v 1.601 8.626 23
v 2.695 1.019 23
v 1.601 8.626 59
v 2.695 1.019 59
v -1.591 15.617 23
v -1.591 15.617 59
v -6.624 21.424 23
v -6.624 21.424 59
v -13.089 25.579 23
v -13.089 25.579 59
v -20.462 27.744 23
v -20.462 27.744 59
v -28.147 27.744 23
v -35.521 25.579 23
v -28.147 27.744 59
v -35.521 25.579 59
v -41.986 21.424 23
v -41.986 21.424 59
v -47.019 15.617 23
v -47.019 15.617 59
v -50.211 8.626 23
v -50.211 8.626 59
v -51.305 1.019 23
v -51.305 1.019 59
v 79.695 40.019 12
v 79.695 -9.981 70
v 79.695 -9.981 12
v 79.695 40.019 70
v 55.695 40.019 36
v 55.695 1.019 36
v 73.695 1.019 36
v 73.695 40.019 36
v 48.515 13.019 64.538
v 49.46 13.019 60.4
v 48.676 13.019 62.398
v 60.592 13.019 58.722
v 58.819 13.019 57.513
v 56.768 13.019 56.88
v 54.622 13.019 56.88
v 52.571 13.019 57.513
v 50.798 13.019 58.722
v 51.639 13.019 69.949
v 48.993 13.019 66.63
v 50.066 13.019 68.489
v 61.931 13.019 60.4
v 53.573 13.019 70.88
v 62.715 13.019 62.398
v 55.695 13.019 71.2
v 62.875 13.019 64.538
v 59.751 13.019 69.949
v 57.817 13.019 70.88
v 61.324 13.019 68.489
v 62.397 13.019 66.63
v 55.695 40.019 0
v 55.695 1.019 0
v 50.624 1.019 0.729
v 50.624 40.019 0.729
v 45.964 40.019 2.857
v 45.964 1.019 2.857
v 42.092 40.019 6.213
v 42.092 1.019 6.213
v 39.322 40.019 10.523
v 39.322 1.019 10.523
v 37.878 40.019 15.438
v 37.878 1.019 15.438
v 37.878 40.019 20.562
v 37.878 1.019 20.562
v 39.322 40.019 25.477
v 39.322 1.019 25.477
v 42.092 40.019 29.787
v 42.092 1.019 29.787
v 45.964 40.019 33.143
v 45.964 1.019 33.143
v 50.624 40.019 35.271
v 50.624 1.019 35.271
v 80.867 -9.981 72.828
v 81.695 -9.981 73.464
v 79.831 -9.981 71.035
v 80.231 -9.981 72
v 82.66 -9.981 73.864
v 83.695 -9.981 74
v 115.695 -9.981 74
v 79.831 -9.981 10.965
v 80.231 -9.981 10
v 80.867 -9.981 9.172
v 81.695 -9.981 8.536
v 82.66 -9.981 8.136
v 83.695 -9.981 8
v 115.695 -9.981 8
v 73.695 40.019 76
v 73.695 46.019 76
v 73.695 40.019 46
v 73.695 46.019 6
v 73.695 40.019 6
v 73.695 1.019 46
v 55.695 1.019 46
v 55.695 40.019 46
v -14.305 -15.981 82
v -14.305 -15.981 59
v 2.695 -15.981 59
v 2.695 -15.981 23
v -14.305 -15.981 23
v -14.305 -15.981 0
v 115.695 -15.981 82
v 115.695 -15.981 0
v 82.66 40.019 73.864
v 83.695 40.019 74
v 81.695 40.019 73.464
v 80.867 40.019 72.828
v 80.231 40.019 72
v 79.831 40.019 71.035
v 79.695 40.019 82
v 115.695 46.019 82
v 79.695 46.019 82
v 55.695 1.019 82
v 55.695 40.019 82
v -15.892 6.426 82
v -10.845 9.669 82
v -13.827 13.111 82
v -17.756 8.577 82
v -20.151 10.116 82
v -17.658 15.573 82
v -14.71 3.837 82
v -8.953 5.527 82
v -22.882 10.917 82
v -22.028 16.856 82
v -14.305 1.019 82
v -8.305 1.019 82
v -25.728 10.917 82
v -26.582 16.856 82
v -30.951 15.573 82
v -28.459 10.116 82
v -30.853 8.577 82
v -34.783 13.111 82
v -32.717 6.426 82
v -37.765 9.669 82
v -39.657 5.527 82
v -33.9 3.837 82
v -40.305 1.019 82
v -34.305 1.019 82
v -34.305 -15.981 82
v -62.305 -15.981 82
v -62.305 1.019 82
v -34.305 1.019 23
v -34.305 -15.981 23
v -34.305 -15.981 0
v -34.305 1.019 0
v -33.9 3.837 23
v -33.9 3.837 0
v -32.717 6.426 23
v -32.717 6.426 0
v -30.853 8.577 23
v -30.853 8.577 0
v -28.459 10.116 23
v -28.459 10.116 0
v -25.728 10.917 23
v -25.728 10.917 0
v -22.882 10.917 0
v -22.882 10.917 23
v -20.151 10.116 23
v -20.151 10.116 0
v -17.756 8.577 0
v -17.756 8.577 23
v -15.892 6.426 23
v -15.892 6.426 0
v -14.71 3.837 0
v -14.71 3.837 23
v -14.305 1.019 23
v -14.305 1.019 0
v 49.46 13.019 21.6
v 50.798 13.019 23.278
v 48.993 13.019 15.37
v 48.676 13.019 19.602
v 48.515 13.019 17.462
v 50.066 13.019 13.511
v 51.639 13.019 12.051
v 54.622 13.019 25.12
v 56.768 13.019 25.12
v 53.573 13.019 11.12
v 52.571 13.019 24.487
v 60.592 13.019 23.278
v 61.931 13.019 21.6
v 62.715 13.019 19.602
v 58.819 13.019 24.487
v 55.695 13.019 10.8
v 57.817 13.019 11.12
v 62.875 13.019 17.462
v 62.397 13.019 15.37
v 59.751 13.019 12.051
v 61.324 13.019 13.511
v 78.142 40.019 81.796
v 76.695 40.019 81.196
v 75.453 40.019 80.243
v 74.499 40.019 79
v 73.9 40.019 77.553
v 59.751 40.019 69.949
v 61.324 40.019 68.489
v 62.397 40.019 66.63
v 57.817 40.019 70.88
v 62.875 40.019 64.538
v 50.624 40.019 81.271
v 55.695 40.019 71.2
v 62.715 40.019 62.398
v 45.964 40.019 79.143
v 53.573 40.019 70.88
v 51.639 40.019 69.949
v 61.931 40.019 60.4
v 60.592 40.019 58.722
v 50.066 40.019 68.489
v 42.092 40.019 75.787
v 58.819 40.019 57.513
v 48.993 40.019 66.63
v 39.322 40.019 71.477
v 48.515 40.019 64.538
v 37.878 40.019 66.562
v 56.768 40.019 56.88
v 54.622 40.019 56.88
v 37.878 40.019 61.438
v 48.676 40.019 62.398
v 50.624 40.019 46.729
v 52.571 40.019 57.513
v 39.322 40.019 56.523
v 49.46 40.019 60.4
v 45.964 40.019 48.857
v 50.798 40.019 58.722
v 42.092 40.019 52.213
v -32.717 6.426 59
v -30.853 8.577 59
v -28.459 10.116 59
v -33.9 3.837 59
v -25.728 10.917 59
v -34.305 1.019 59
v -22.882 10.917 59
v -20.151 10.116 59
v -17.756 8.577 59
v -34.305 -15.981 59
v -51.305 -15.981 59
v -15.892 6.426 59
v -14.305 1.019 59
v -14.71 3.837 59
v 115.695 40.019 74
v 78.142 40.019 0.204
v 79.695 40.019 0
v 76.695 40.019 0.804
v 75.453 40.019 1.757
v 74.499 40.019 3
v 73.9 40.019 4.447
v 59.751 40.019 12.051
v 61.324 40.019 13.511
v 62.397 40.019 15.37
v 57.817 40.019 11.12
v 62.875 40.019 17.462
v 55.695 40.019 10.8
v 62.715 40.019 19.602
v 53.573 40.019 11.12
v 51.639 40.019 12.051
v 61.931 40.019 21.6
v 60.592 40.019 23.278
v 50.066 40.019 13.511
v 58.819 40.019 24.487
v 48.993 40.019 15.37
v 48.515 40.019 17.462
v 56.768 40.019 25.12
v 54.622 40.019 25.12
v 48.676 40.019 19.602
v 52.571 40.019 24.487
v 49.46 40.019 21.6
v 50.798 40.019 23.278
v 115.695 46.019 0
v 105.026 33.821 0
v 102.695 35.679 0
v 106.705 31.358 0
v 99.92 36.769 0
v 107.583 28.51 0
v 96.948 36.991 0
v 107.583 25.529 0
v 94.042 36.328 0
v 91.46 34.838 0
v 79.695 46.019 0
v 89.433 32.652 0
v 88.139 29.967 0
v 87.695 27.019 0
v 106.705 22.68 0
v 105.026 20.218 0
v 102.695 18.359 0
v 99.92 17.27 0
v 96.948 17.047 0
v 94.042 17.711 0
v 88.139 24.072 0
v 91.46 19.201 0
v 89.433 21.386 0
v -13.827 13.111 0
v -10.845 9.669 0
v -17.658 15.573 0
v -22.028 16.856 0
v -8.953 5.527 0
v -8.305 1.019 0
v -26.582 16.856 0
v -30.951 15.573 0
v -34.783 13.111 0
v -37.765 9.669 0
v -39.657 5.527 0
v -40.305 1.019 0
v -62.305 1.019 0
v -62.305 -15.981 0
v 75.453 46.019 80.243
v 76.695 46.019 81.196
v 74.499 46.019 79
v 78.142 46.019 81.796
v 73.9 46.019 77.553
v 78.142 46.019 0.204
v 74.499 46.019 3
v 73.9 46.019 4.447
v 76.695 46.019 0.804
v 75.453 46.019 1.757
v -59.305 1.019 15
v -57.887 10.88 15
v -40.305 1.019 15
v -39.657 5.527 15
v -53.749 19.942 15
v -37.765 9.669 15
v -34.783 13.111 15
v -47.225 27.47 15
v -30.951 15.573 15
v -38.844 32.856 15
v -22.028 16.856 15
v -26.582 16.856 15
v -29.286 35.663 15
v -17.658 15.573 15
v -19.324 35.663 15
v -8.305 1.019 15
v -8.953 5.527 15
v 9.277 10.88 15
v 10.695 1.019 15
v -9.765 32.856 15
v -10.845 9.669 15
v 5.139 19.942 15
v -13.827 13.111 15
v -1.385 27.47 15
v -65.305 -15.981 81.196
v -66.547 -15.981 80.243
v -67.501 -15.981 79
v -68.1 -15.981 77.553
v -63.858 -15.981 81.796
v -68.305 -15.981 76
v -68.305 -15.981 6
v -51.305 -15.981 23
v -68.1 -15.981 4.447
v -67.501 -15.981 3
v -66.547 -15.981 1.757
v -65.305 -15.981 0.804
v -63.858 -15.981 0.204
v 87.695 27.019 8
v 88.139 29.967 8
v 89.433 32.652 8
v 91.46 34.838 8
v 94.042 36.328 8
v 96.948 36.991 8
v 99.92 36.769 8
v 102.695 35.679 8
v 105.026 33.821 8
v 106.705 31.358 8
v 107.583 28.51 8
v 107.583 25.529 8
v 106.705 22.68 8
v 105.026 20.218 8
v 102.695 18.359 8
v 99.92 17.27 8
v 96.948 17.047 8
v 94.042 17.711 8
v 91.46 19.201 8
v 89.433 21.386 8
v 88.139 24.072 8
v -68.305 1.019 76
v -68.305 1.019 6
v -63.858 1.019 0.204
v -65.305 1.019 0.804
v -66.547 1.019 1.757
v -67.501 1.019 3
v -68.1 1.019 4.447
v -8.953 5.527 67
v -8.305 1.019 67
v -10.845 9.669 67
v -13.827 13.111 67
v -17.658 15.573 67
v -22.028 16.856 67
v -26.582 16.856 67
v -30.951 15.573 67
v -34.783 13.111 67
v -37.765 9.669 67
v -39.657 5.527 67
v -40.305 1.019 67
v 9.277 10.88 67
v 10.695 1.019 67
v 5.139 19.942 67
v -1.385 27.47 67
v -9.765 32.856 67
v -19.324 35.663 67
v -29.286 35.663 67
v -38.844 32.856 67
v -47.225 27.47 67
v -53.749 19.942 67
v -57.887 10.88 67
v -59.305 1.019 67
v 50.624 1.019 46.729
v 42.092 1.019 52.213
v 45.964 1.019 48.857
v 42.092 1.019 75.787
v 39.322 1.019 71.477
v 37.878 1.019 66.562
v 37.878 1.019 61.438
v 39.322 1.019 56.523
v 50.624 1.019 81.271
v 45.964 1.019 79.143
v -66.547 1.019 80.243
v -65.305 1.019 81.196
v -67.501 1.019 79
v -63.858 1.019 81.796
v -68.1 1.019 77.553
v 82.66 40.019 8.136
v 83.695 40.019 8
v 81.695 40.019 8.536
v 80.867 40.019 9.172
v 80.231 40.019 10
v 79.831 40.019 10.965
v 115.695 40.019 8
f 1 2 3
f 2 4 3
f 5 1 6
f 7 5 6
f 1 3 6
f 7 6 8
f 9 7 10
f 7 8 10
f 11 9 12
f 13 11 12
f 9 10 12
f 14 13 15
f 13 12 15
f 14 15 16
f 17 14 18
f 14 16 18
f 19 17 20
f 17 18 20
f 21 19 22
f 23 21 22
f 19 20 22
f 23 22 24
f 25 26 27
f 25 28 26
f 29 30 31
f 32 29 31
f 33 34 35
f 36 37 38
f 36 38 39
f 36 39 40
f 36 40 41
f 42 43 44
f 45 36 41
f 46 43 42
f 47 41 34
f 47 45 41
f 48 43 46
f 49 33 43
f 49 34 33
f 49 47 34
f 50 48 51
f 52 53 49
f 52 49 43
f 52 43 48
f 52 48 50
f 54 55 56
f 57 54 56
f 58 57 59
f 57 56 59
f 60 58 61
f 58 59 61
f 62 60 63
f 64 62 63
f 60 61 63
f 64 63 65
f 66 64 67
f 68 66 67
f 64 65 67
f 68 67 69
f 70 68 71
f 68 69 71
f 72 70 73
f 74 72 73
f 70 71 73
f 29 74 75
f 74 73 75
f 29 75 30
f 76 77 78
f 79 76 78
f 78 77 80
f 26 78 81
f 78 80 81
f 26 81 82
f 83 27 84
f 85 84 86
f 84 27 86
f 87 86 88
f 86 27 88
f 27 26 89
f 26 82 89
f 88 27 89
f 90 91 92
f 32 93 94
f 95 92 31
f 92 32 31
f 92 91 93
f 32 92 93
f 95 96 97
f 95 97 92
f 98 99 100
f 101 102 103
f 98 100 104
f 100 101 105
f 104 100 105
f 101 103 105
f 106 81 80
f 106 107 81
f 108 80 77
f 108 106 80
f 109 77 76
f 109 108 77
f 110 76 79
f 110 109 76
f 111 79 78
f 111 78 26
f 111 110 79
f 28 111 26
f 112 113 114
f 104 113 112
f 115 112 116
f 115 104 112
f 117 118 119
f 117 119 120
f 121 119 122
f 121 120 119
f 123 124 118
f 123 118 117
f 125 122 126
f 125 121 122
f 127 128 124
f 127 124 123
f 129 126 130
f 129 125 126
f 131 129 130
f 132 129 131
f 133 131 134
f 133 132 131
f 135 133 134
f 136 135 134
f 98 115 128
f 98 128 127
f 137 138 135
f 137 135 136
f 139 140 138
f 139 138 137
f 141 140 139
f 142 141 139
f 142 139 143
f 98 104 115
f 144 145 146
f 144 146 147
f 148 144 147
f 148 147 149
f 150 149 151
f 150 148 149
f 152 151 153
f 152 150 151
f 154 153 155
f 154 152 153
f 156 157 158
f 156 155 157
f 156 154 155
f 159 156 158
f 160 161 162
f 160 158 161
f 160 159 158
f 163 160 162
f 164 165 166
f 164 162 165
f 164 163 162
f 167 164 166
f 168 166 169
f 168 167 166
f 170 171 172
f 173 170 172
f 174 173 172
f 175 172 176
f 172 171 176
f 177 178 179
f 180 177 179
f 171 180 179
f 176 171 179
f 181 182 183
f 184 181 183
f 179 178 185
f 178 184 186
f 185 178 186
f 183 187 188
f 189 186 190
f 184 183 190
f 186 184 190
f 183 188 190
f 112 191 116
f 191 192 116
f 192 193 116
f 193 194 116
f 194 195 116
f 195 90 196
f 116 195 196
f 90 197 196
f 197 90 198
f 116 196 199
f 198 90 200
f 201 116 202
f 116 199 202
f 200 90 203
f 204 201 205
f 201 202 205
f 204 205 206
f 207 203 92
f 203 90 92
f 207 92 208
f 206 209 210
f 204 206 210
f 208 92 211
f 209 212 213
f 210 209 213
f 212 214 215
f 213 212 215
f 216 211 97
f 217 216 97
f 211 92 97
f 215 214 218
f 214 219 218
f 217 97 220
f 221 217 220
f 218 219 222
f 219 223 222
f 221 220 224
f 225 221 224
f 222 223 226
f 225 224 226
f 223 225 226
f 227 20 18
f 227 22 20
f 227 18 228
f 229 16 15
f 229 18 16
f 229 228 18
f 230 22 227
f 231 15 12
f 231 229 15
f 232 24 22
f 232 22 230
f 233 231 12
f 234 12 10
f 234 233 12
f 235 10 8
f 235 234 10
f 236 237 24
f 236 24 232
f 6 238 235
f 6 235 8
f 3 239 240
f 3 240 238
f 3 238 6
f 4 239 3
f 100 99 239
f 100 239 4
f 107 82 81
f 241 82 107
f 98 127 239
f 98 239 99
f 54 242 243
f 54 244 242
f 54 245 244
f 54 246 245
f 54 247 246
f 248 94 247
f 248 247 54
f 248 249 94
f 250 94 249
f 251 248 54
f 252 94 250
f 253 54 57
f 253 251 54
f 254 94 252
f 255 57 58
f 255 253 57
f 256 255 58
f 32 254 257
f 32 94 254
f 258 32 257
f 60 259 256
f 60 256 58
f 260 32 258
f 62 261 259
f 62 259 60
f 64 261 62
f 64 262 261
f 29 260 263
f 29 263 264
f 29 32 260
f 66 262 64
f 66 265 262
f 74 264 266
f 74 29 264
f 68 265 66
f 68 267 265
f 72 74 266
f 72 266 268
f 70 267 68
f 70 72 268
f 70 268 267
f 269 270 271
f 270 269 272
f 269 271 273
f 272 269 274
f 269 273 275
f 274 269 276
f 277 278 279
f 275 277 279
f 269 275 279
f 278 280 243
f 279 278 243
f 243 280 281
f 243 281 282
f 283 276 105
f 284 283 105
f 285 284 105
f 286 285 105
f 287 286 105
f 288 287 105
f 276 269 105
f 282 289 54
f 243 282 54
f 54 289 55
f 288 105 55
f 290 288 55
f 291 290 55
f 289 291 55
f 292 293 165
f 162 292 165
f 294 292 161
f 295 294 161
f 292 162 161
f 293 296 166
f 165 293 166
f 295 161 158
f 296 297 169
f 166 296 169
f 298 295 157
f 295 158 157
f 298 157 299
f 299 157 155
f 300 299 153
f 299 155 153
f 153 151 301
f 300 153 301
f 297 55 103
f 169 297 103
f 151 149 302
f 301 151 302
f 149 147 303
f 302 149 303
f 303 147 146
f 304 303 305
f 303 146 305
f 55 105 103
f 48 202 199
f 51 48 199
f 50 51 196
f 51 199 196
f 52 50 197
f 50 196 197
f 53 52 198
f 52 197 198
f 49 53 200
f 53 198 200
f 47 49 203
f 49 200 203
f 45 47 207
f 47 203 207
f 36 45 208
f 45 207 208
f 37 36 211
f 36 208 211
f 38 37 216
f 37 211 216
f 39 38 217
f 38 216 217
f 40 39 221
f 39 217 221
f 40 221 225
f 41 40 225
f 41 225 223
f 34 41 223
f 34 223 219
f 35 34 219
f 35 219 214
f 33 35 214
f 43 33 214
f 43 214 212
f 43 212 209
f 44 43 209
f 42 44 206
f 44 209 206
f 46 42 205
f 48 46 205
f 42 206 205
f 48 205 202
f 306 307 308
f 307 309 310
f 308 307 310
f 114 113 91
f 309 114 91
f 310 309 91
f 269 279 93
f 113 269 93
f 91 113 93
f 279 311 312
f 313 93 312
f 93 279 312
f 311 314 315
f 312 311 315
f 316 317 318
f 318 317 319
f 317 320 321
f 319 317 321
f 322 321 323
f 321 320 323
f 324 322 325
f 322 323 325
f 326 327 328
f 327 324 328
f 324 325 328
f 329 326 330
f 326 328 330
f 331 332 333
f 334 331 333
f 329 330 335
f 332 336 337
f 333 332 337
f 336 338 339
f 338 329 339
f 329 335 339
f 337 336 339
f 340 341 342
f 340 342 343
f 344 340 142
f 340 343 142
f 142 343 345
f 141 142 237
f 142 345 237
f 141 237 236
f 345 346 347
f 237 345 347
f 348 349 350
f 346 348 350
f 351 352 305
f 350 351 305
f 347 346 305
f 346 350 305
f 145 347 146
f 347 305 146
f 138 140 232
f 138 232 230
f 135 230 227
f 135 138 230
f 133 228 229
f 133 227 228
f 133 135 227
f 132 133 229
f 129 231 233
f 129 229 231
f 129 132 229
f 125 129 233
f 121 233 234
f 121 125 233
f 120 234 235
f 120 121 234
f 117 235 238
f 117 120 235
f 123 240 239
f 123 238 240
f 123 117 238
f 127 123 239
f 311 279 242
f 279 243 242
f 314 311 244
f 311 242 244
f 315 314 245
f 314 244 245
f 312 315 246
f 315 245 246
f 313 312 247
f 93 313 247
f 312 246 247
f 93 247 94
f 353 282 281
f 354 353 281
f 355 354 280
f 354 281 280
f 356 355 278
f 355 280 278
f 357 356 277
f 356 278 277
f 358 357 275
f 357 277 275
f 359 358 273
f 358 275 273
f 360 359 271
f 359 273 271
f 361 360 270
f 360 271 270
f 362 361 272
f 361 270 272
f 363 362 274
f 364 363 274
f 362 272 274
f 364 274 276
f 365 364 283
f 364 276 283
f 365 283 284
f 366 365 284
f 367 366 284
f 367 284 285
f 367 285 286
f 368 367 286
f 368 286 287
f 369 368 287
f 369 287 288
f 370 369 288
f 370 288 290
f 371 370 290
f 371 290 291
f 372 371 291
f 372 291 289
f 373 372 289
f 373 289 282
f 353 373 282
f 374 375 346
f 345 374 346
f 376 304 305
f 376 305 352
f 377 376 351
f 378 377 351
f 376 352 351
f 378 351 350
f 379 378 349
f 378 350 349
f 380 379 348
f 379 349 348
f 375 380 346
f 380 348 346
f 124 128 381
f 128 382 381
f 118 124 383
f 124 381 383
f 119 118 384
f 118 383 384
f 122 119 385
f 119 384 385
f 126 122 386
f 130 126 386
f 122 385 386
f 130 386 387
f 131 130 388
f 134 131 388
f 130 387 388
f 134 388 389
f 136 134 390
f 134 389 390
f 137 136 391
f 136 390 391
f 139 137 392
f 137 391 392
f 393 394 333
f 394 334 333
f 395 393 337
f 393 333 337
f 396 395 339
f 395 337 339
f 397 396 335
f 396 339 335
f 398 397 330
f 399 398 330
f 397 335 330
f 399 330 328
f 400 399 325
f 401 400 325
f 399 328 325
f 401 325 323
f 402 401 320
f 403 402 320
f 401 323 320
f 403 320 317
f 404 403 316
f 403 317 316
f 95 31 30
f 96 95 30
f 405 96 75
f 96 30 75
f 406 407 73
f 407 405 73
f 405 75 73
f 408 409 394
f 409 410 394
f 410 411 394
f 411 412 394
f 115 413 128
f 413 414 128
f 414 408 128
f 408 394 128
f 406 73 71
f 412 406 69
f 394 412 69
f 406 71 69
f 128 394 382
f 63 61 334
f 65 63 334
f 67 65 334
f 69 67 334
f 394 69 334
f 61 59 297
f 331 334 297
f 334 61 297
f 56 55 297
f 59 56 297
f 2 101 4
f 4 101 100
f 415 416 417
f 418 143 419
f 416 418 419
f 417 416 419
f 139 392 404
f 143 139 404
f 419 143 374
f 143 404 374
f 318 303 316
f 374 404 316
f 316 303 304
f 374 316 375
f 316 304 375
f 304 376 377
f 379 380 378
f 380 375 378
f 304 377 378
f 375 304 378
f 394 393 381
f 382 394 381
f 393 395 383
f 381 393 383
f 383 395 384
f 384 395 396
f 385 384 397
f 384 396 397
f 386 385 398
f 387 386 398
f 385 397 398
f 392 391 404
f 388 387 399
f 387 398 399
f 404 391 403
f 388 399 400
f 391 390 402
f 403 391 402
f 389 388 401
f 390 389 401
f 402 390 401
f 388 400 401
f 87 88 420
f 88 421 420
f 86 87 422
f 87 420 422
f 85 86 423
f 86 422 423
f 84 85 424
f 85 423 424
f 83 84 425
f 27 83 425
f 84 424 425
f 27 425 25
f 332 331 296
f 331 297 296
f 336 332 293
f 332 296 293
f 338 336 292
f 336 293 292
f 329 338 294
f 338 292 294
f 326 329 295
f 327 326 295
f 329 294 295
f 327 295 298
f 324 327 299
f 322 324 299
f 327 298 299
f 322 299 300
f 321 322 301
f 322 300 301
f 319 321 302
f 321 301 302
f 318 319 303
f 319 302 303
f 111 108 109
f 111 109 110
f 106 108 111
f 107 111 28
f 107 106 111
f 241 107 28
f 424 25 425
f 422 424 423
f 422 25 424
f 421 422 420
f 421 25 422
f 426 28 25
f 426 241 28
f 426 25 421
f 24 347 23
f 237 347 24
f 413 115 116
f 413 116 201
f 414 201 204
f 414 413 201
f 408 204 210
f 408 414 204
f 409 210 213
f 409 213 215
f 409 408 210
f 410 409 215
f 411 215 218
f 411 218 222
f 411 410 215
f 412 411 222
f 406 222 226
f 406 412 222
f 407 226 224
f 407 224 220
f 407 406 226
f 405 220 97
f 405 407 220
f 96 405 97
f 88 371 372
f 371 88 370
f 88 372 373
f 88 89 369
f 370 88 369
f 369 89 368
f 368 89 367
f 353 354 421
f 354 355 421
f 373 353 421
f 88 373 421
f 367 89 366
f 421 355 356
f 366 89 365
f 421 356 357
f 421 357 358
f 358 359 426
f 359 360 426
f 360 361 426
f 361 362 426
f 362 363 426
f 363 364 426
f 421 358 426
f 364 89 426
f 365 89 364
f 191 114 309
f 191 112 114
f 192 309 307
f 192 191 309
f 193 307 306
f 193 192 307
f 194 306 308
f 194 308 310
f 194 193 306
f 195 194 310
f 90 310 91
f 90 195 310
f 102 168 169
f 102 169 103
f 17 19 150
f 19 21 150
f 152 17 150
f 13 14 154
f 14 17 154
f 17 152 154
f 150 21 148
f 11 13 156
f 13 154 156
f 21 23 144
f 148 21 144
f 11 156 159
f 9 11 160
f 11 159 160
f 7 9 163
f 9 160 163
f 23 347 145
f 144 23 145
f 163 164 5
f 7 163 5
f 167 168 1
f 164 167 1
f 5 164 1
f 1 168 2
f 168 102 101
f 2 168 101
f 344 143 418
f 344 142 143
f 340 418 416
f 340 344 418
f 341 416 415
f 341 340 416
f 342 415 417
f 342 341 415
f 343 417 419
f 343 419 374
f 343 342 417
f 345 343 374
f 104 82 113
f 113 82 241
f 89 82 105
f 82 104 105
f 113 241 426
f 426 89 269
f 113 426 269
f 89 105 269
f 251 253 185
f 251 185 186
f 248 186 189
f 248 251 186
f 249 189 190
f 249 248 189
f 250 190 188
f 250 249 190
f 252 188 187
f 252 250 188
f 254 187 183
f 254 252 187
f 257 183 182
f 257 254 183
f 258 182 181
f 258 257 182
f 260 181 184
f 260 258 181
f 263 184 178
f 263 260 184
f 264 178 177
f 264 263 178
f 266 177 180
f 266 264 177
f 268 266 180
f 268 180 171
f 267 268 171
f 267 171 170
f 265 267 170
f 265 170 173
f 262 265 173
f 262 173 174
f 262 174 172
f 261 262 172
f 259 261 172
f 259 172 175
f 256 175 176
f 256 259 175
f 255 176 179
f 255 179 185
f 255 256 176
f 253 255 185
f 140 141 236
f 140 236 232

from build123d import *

# Parameters (mm, degrees)
BOSS_EXTRUDE1_DEPTH = 82
SKETCH2_W           = 66
SKETCH2_H           = 50
CUT_EXTRUDE1_DEPTH  = 36
SKETCH3_R           = 10
CUT_EXTRUDE2_DEPTH  = 36
BOSS_EXTRUDE6_DEPTH = 39
SKETCH5_R           = 7.2
CUT_EXTRUDE3_DEPTH  = 27
REVOLVE2_ANGLE      = 180
CUT_EXTRUDE4_DEPTH  = 153
SKETCH10_W          = 54
SKETCH10_H          = 36
CUT_EXTRUDE5_DEPTH  = 17
SKETCH11_W          = 17
SKETCH11_H          = 36
CUT_REVOLVE2_ANGLE  = 180
FILLET1_R           = 4
FILLET2_R           = 6


with BuildPart() as part:
    # Sketch1 → Boss-Extrude1 (new body)
    with BuildSketch(Plane.XY):
        Polygon((-68.304856892, -15.980758971), (115.695143108, -15.980758971), (115.695143108, 46.019241029), (73.695143108, 46.019241029), (73.695143108, 1.019241029), (-68.304856892, 1.019241029), align=None)
    extrude(amount=BOSS_EXTRUDE1_DEPTH)

    # Sketch2 → Cut-Extrude1 (cut)
    with BuildSketch(Plane(origin=(115.695143108, 0, 0), x_dir=(0, 0, -1), z_dir=(1, 0, 0))):
        with Locations((-41, 15.019241029)):
            Rectangle(SKETCH2_W, SKETCH2_H)
    extrude(amount=-CUT_EXTRUDE1_DEPTH, mode=Mode.SUBTRACT)

    # Sketch3 → Cut-Extrude2 (cut)
    with BuildSketch(Plane(origin=(0, 0, 0), x_dir=(-1, 0, 0), z_dir=(0, 0, -1))):
        with Locations((-97.695143108, 27.019241029)):
            Circle(SKETCH3_R)
    extrude(amount=-CUT_EXTRUDE2_DEPTH, mode=Mode.SUBTRACT)

    # Sketch4 → Boss-Extrude6 (add)
    with BuildSketch(Plane(origin=(0, 1.019241029, 0), x_dir=(1, 0, 0), z_dir=(0, 1, 0))):
        with BuildLine():
            Line((55.695143108, -46), (73.695143108, -46))
            Line((73.695143108, -46), (73.695143108, -82))
            Line((73.695143108, -82), (55.695143108, -82))
            ThreePointArc((55.695143108, -82), (37.695143108, -64), (55.695143108, -46))
        make_face()
    boss_extrude6 = extrude(amount=BOSS_EXTRUDE6_DEPTH)

    # Sketch5 → Cut-Extrude3 (cut)
    with BuildSketch(Plane(origin=(0, 40.019241029, 0), x_dir=(1, 0, 0), z_dir=(0, 1, 0))):
        with Locations(Location((55.695143108, -64, 0), (0, 0, 270))):
            Circle(SKETCH5_R)
    cut_extrude3 = extrude(amount=-CUT_EXTRUDE3_DEPTH, mode=Mode.SUBTRACT)

    # Mirror3: Boss-Extrude6, Cut-Extrude3 across plane
    add(boss_extrude6.mirror(Plane.XY.offset(41)))
    add(cut_extrude3.mirror(Plane.XY.offset(41)), mode=Mode.SUBTRACT)

    # Sketch7 → Revolve2 (revolve)
    with BuildSketch(Plane(origin=(0, 1.019241029, 0), x_dir=(1, 0, 0), z_dir=(0, 1, 0))):
        Polygon((-24.304856892, 0), (-24.304856892, -82), (-8.304856892, -82), (-8.304856892, -67), (10.695143108, -67), (10.695143108, -15), (-8.304856892, -15), (-8.304856892, 0), align=None)
    revolve(axis=Axis((-24.304856892, 1.019241029, 0), (0, 0, 1)), revolution_arc=REVOLVE2_ANGLE)

    # Sketch8 → Cut-Extrude4 (cut)
    with BuildSketch(Plane.XY.offset(82)):
        with BuildLine():
            Line((-14.304856892, 1.019241029), (-14.304856892, -15.980758971))
            Line((-14.304856892, -15.980758971), (-34.304856892, -15.980758971))
            Line((-34.304856892, -15.980758971), (-34.304856892, 1.019241029))
            ThreePointArc((-34.304856892, 1.019241029), (-24.304856892, 11.019241029), (-14.304856892, 1.019241029))
        make_face()
    extrude(amount=-CUT_EXTRUDE4_DEPTH, mode=Mode.SUBTRACT)

    # Sketch10 → Cut-Extrude5 (cut)
    with BuildSketch(Plane.XZ.offset(15.980758971)):
        with Locations((-24.304856892, 41)):
            Rectangle(SKETCH10_W, SKETCH10_H)
    extrude(amount=-CUT_EXTRUDE5_DEPTH, mode=Mode.SUBTRACT)

    # Sketch11 → Cut-Revolve2 (revolve, cut)
    with BuildSketch(Plane.XZ.offset(-1.019241029)):
        with Locations((-5.804856892, 41)):
            Rectangle(SKETCH11_W, SKETCH11_H)
    revolve(axis=Axis((-24.304856892, 1.019241029, 0), (0, 0, 1)), revolution_arc=CUT_REVOLVE2_ANGLE, mode=Mode.SUBTRACT)

    # Fillet1
    fillet1_edges = [part.edges().sort_by_distance(p)[0] for p in [
        (79.695143108, 15.019241029, 74),
        (79.695143108, 15.019241029, 8),
    ]]
    fillet(fillet1_edges, radius=FILLET1_R)

    # Fillet2
    fillet2_edges = [part.edges().sort_by_distance(p)[0] for p in [
        (73.695143108, 43.019241029, 82),
        (-68.304856892, -7.480758971, 82),
        (73.695143108, 43.019241029, 0),
        (-68.304856892, -7.480758971, 0),
    ]]
    fillet(fillet2_edges, radius=FILLET2_R)


solid = part.part
